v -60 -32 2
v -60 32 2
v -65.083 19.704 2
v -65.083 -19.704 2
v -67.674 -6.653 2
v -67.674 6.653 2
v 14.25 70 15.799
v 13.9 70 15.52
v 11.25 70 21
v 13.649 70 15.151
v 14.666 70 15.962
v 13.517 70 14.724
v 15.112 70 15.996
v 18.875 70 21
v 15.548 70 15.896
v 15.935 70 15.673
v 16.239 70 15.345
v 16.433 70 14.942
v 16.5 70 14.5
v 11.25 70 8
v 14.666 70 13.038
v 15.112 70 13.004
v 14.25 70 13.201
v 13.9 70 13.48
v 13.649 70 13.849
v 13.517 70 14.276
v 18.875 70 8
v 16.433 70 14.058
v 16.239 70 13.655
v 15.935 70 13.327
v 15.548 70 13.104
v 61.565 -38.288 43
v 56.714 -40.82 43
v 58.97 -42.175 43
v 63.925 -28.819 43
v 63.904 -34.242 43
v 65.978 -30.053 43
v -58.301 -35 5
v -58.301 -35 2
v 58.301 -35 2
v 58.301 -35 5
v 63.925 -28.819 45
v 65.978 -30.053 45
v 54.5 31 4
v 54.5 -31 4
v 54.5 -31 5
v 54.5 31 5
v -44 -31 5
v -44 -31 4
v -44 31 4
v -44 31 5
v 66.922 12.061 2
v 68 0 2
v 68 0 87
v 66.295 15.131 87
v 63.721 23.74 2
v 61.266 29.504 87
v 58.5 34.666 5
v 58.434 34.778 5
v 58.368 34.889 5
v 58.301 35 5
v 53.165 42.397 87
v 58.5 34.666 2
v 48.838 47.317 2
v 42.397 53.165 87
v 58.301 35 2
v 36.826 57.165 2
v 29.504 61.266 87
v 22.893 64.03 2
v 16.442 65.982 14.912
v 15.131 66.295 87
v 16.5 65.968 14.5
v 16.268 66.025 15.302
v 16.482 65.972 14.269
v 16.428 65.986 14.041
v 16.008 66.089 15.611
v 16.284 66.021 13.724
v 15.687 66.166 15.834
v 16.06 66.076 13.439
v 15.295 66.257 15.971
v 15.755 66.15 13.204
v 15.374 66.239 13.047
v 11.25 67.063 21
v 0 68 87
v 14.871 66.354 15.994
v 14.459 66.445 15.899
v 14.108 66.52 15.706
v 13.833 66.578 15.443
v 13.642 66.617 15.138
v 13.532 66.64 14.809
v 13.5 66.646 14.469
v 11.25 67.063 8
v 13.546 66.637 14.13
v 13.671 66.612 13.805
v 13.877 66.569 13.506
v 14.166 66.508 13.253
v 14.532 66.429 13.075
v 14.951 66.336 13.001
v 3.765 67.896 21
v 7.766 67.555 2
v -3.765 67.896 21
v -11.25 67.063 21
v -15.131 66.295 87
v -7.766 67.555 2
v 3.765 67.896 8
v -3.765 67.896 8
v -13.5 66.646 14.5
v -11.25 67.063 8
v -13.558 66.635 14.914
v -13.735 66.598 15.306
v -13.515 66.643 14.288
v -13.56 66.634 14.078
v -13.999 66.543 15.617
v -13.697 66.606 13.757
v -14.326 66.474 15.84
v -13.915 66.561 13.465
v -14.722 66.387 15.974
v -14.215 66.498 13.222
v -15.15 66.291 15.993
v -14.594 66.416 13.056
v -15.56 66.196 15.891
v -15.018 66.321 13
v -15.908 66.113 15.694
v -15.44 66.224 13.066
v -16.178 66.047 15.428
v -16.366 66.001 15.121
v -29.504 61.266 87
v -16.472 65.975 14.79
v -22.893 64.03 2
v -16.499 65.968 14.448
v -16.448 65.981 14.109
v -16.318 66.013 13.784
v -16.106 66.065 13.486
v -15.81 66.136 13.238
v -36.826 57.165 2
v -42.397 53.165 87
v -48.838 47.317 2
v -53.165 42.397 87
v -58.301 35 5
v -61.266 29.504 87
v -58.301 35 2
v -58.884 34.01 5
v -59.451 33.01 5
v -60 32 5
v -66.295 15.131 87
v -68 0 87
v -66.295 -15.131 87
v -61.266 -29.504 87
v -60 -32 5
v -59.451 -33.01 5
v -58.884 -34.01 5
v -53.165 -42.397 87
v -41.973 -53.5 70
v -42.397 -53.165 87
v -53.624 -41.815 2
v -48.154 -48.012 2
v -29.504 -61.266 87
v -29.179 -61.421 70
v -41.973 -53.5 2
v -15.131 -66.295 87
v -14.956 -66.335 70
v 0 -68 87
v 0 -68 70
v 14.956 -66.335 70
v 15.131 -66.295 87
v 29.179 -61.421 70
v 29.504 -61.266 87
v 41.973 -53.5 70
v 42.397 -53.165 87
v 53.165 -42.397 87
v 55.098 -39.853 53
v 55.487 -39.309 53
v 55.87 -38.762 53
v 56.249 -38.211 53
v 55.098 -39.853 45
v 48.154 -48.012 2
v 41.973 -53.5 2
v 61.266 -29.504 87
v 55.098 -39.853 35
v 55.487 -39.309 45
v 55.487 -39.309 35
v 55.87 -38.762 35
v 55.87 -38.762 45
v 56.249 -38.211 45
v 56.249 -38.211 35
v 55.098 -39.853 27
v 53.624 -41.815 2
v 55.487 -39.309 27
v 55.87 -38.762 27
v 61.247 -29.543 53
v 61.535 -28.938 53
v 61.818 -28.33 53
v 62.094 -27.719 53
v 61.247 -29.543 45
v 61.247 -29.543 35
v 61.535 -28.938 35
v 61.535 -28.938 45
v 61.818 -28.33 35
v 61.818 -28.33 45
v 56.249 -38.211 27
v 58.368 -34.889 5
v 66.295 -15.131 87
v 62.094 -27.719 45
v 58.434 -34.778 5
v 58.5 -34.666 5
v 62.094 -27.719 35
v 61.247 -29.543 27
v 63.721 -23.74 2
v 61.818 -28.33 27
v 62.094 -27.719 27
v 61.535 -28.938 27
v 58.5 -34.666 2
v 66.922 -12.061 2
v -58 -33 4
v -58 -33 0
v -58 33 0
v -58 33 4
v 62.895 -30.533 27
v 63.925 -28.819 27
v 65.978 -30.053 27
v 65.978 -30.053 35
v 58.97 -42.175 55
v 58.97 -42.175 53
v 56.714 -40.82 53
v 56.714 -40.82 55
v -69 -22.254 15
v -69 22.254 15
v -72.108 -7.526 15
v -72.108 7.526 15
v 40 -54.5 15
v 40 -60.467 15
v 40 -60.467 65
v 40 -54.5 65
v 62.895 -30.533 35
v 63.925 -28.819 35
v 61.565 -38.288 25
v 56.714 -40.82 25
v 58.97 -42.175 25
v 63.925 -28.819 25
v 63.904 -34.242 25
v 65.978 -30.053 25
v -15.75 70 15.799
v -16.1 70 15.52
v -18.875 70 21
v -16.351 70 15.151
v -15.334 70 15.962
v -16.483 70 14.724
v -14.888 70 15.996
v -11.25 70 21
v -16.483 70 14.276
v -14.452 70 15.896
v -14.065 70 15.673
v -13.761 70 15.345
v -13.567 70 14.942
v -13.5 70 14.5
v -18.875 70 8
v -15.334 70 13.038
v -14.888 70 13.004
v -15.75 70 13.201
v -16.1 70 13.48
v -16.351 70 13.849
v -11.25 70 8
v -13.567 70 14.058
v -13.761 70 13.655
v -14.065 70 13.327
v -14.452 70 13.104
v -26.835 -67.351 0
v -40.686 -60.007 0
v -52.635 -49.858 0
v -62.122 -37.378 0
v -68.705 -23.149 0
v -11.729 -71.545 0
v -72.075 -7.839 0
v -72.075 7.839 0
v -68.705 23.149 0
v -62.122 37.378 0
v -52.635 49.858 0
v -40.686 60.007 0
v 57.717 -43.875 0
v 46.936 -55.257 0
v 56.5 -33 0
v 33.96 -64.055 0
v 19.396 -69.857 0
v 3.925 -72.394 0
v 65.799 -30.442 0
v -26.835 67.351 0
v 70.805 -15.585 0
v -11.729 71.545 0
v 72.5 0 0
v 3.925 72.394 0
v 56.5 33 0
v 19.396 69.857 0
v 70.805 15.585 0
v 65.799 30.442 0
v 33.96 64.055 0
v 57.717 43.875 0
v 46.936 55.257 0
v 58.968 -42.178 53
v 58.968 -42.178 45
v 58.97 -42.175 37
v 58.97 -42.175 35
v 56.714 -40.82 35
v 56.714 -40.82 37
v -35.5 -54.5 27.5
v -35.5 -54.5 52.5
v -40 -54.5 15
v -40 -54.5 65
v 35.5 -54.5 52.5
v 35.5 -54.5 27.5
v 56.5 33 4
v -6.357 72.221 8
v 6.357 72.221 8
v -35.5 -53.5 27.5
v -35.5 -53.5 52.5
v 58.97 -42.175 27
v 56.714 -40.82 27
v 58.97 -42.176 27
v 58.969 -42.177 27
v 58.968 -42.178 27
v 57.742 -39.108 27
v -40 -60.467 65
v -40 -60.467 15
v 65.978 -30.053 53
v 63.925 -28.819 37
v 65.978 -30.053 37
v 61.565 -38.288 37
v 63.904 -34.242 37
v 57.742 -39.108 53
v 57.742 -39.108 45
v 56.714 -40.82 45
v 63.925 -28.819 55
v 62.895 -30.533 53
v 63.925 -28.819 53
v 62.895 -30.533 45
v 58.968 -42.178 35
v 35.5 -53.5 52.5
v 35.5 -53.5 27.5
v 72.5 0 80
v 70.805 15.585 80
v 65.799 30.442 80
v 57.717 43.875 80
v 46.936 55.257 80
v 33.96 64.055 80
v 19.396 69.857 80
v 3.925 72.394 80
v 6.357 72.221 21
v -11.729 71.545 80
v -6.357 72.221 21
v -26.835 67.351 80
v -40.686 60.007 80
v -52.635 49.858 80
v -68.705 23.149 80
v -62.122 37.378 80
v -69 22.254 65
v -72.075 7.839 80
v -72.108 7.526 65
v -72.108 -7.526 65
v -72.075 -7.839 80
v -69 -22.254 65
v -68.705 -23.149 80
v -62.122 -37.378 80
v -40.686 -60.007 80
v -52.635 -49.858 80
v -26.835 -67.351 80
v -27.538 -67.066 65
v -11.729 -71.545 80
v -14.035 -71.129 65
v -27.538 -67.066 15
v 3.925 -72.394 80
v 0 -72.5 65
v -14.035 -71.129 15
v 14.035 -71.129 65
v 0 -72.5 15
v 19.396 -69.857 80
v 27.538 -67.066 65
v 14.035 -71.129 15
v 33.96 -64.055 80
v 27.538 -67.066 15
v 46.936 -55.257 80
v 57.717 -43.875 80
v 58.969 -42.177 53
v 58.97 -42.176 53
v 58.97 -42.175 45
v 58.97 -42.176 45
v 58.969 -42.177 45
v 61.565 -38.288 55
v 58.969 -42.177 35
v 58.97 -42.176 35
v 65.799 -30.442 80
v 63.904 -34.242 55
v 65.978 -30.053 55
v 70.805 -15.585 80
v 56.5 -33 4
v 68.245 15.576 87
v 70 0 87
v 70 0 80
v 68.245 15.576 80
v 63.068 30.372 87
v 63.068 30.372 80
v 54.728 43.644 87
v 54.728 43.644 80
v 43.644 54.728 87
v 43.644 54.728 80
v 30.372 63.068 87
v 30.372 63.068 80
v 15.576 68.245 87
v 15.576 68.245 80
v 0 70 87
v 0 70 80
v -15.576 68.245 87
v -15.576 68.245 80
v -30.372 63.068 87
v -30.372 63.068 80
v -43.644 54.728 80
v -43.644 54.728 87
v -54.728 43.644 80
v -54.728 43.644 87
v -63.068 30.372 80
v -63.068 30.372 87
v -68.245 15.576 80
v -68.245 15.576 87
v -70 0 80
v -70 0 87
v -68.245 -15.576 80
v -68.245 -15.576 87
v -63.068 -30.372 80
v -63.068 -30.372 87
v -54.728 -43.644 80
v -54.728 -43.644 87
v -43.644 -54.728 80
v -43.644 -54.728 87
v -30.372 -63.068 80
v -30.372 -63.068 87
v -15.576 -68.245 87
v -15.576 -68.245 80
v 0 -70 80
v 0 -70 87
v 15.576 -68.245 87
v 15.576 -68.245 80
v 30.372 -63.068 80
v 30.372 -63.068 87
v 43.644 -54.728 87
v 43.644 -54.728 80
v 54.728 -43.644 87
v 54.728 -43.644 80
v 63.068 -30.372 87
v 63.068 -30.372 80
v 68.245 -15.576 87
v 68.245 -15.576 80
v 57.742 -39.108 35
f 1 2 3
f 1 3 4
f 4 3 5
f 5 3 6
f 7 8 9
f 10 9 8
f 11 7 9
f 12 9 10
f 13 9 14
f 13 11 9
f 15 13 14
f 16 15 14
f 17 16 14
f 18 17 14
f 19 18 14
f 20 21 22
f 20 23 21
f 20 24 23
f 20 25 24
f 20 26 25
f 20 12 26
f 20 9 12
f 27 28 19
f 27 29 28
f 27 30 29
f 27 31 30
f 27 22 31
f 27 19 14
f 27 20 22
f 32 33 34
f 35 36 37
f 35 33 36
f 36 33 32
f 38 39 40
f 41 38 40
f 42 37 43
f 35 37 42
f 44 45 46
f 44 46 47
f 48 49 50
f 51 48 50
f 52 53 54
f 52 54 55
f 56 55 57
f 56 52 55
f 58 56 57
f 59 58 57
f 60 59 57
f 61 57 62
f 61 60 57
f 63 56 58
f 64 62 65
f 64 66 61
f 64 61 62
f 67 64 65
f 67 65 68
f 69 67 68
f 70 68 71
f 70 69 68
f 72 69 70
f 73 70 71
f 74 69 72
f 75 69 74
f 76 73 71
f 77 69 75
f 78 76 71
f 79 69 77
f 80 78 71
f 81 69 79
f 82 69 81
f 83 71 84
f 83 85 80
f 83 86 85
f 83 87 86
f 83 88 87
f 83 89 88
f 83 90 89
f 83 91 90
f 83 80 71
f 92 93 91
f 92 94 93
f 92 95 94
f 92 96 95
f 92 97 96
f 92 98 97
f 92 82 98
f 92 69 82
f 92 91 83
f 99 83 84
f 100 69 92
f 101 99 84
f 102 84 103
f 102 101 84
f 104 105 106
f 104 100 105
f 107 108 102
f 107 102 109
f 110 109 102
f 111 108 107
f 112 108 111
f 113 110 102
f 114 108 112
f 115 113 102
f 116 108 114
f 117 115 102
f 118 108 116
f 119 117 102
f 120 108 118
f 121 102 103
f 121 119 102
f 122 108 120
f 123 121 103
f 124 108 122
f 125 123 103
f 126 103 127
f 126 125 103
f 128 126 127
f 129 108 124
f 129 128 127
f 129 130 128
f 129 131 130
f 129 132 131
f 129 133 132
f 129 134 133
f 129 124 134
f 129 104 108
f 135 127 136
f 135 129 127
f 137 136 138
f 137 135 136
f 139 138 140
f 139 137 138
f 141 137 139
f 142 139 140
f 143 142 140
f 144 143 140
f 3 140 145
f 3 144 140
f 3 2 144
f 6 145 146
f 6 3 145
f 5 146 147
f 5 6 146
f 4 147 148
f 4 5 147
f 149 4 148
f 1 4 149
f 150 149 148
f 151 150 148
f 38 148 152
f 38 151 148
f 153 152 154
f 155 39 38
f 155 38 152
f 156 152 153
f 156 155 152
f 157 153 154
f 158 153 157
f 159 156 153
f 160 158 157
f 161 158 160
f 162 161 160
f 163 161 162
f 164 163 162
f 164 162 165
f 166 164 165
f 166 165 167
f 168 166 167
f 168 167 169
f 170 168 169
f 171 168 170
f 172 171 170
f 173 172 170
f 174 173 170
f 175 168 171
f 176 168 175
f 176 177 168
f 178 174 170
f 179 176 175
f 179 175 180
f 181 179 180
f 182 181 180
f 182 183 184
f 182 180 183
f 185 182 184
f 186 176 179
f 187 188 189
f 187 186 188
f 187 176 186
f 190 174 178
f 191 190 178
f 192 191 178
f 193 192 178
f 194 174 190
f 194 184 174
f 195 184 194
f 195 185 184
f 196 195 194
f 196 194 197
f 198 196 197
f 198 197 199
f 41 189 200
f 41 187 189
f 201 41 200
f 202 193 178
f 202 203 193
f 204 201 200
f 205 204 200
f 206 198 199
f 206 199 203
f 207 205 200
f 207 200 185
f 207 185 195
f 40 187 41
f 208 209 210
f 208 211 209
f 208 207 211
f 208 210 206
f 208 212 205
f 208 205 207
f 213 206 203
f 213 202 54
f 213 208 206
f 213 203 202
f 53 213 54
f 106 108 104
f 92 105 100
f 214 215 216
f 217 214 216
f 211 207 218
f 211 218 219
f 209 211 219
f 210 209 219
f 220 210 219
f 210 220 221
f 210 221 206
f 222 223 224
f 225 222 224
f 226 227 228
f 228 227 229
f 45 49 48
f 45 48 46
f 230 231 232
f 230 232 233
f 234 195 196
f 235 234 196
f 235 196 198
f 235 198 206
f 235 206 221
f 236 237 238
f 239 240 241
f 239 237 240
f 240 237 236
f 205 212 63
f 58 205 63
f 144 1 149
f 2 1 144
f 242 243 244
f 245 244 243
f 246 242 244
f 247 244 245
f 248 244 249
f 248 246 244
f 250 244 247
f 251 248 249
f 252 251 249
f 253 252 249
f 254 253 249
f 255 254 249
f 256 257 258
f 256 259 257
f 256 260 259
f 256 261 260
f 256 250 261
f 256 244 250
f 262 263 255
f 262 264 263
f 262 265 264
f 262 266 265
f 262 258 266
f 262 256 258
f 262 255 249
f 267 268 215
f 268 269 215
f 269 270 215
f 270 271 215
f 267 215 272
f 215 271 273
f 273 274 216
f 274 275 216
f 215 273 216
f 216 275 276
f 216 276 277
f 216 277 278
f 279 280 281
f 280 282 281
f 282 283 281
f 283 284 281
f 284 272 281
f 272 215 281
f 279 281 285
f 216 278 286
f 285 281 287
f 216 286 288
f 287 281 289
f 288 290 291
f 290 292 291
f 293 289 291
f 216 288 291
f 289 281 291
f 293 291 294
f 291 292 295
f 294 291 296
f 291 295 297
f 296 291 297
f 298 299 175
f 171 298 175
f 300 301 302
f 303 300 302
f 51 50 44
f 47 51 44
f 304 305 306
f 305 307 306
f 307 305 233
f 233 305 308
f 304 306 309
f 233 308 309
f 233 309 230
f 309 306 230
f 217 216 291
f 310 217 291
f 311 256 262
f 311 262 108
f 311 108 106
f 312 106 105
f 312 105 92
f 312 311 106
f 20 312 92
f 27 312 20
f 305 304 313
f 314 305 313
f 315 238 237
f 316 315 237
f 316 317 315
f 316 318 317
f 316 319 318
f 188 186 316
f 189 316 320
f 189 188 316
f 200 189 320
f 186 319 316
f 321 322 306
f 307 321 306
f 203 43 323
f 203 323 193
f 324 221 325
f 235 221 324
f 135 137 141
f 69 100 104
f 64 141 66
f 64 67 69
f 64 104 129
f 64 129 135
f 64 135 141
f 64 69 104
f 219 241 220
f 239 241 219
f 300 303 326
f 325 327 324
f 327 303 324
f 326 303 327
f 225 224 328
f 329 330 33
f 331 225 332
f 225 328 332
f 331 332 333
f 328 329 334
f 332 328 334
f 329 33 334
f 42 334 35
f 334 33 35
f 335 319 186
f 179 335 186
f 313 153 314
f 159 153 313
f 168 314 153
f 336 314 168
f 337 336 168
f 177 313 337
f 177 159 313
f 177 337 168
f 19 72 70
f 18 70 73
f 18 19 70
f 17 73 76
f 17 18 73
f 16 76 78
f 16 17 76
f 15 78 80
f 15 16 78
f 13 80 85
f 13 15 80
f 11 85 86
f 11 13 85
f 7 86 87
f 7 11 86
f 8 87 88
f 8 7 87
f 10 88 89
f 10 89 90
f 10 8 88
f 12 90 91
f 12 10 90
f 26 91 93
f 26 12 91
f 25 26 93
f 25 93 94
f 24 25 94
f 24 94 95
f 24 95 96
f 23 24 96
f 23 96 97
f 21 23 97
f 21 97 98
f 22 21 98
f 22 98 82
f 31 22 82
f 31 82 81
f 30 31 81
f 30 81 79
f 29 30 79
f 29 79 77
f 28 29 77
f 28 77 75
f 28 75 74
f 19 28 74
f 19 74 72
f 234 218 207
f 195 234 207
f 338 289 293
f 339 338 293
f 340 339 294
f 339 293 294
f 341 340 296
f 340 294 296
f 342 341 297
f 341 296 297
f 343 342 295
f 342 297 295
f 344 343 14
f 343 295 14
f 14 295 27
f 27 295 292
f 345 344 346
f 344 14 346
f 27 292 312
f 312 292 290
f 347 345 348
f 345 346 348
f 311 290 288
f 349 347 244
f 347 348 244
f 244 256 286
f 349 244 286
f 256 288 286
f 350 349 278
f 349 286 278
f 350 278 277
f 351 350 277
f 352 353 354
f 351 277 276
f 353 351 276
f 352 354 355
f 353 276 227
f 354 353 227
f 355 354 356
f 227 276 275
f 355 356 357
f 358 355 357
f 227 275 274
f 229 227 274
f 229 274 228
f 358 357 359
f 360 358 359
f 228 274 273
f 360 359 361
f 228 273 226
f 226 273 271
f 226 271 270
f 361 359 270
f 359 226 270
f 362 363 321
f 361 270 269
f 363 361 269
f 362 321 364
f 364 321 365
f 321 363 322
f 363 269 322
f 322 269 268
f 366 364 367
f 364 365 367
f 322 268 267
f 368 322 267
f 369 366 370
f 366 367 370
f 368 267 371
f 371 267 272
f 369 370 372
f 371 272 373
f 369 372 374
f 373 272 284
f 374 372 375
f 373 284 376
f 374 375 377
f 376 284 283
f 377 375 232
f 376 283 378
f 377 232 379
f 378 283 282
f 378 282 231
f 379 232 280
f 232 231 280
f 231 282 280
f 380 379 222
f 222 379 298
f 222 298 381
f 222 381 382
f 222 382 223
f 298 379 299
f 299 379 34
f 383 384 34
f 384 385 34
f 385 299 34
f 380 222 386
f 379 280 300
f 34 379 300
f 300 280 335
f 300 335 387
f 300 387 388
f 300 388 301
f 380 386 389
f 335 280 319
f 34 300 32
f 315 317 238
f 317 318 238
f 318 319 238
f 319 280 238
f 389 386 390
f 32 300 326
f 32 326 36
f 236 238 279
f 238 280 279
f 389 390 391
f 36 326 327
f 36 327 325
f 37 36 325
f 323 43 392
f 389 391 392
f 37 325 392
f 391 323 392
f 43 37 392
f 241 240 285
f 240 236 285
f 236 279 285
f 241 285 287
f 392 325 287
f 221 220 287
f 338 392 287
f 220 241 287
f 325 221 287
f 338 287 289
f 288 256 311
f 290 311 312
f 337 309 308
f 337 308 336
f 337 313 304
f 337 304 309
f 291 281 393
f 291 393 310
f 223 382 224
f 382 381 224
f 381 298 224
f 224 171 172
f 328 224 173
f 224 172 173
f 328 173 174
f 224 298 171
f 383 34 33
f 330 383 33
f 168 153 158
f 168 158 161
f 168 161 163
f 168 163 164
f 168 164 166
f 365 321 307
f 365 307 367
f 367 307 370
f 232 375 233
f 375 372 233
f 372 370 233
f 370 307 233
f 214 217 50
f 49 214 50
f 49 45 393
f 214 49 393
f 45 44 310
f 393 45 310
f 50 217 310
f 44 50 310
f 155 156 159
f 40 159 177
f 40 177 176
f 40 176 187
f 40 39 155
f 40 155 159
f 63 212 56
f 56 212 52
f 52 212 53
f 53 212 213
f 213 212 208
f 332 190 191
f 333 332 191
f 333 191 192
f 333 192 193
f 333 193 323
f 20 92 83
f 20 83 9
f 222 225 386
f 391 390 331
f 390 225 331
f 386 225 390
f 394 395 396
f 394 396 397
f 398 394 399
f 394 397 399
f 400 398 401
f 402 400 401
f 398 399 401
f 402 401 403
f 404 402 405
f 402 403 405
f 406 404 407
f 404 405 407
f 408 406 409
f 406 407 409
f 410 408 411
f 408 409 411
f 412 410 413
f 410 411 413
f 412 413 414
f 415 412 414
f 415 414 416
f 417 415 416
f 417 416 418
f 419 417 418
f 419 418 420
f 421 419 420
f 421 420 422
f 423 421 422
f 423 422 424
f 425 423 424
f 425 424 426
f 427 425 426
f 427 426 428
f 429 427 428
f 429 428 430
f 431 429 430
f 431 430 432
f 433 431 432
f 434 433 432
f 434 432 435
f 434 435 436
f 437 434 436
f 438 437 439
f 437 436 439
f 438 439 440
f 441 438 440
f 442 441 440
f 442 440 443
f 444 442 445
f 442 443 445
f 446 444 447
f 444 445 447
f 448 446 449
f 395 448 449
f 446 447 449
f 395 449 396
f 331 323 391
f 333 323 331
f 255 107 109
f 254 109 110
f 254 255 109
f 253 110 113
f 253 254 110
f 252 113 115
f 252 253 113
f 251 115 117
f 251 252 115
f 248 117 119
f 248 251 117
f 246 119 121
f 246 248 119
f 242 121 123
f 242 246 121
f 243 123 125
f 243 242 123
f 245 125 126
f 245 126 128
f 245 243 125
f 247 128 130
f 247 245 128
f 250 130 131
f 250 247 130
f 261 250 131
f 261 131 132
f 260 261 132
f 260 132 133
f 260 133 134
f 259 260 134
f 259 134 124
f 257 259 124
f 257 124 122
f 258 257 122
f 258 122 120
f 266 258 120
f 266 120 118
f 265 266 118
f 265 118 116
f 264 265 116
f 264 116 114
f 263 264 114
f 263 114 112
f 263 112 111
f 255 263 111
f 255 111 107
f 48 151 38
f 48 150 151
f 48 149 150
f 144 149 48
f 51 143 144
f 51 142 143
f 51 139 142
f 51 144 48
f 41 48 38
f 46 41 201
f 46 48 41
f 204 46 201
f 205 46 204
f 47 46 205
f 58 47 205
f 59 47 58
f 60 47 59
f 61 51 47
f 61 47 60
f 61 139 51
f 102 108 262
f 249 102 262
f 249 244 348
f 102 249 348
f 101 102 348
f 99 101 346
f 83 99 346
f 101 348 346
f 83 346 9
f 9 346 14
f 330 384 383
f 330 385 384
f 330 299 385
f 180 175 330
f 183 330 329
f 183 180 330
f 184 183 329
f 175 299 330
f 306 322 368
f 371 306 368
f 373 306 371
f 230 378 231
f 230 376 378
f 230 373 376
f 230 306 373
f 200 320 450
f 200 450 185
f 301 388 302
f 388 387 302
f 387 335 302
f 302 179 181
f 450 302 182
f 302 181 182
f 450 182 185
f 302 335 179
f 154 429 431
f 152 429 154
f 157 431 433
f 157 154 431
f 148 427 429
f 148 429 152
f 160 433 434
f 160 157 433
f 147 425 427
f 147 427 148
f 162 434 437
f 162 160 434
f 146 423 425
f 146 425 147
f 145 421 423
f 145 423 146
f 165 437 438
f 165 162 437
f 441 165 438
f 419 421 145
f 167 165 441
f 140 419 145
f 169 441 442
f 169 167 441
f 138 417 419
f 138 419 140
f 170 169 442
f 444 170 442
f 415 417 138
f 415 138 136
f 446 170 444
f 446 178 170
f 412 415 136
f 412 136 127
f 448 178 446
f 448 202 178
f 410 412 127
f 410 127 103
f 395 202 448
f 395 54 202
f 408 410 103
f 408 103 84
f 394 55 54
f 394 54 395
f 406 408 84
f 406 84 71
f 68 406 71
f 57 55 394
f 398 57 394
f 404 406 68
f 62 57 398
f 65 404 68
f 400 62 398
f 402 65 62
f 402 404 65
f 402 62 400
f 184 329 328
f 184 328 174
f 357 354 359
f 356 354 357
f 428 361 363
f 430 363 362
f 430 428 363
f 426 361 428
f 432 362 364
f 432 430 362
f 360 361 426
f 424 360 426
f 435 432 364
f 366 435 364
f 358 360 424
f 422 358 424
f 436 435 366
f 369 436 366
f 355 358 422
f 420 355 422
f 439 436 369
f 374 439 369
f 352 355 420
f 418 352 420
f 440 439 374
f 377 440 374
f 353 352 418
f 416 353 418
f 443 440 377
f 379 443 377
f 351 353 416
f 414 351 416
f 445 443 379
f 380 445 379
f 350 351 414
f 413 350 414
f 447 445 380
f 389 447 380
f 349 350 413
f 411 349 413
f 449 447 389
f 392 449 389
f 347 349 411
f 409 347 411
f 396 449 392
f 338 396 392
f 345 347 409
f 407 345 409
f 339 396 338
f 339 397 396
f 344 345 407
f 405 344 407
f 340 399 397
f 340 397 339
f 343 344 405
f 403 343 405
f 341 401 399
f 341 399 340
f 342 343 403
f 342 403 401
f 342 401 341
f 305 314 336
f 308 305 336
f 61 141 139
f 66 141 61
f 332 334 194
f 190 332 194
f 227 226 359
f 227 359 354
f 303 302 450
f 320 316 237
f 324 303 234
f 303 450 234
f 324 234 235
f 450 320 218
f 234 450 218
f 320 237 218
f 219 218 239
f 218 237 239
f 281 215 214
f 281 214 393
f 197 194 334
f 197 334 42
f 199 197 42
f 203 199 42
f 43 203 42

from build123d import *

# Parameters (mm, degrees)
CYLINDER004_R          = 1.5
CYLINDER004_DEPTH      = 10
CYLINDER004_ROLL_ANGLE = 90
CYLINDER003_R          = 1.5
CYLINDER003_DEPTH      = 10
CYLINDER003_ROLL_ANGLE = 90
BOX016_W               = 22.5
BOX016_H               = 13
BOX016_DEPTH           = 13
BOX015_W               = 38
BOX015_H               = 10
BOX015_DEPTH           = 13
BOX013_W               = 98.5
BOX013_H               = 62
BOX013_DEPTH           = 10
BOX012_W               = 114.5
BOX012_H               = 66
BOX012_DEPTH           = 4
BOX014_W               = 118.5
BOX014_H               = 70
BOX014_DEPTH           = 5
BOX010_W               = 2
BOX010_H               = 10
BOX010_DEPTH           = 8
BOX010_PLACEMENT_ANGLE = 59
BOX011_W               = 2
BOX011_H               = 10
BOX011_DEPTH           = 8
BOX011_PLACEMENT_ANGLE = 59
BOX009_W               = 2
BOX009_H               = 10
BOX009_DEPTH           = 8
BOX009_PLACEMENT_ANGLE = 59
BOX008_W               = 2
BOX008_H               = 10
BOX008_DEPTH           = 8
BOX008_PLACEMENT_ANGLE = 59
BOX007_W               = 10
BOX007_H               = 45
BOX007_DEPTH           = 50
BOX006_W               = 14
BOX006_H               = 12
BOX006_DEPTH           = 12
BOX006_PLACEMENT_ANGLE = 59
BOX004_W               = 14
BOX004_H               = 12
BOX004_DEPTH           = 12
BOX004_PLACEMENT_ANGLE = 59
BOX002_W               = 71
BOX002_H               = 10
BOX002_DEPTH           = 25
BOX001_W               = 80
BOX001_H               = 30
BOX001_DEPTH           = 50
BOX_W                  = 84
BOX_H                  = 30
BOX_DEPTH              = 70
CYLINDER001_R          = 70
CYLINDER001_DEPTH      = 87
CYLINDER_R             = 72.5
CYLINDER_DEPTH         = 80
CYLINDER002_R          = 68
CYLINDER002_DEPTH      = 85


with BuildPart() as screwcutout002:
    # Cylinder004 → Cylinder004 (new body)
    with BuildSketch(Plane.XY):
        Circle(CYLINDER004_R)
    extrude(amount=CYLINDER004_DEPTH)


with BuildPart() as screwcutout002_1:
    # Cylinder004 roll: moved
    add(screwcutout002.part.rotate(Axis((0, 0, 0), (1, 0, 0)), CYLINDER004_ROLL_ANGLE))


with BuildPart() as screwcutout002_2:
    # Cylinder004 placement: moved
    add(screwcutout002_1.part.moved(Location((-15, 73, 14.5))))


with BuildPart() as screwcutout1:
    # Cylinder003 → Cylinder003 (new body)
    with BuildSketch(Plane.XY):
        Circle(CYLINDER003_R)
    extrude(amount=CYLINDER003_DEPTH)


with BuildPart() as screwcutout1_1:
    # Cylinder003 roll: moved
    add(screwcutout1.part.rotate(Axis((0, 0, 0), (1, 0, 0)), CYLINDER003_ROLL_ANGLE))


with BuildPart() as screwcutout1_2:
    # Cylinder003 placement: moved
    add(screwcutout1_1.part.moved(Location((15, 73, 14.5))))


with BuildPart() as powercutout:
    # Box016 → Box016 (new body)
    with BuildSketch(Plane(origin=(-11.25, 63, 8), x_dir=(1, 0, 0), z_dir=(0, 0, 1))):
        with Locations((11.25, 6.5)):
            Rectangle(BOX016_W, BOX016_H)
    extrude(amount=BOX016_DEPTH)


with BuildPart() as powerswitch:
    # Box015 → Box015 (new body)
    with BuildSketch(Plane(origin=(-19, 70, 8), x_dir=(1, 0, 0), z_dir=(0, 0, 1))):
        with Locations((19, 5)):
            Rectangle(BOX015_W, BOX015_H)
    extrude(amount=BOX015_DEPTH)


with BuildPart() as battery_cutout:
    # Box013 → Box013 (new body)
    with BuildSketch(Plane(origin=(-44, -31, 0), x_dir=(1, 0, 0), z_dir=(0, 0, 1))):
        with Locations((49.25, 31)):
            Rectangle(BOX013_W, BOX013_H)
    extrude(amount=BOX013_DEPTH)


with BuildPart() as battery_cutout001:
    # Box012 → Box012 (new body)
    with BuildSketch(Plane(origin=(-58, -33, 0), x_dir=(1, 0, 0), z_dir=(0, 0, 1))):
        with Locations((57.25, 33)):
            Rectangle(BOX012_W, BOX012_H)
    extrude(amount=BOX012_DEPTH)


with BuildPart() as battery_fillup:
    # Box014 → Box014 (new body)
    with BuildSketch(Plane(origin=(-60, -35, 0), x_dir=(1, 0, 0), z_dir=(0, 0, 1))):
        with Locations((59.25, 35)):
            Rectangle(BOX014_W, BOX014_H)
    extrude(amount=BOX014_DEPTH)


with BuildPart() as pin2_cutout001:
    # Box010 → Box010 (new body)
    with BuildSketch(Plane.XY):
        with Locations((1, 5)):
            Rectangle(BOX010_W, BOX010_H)
    extrude(amount=BOX010_DEPTH)


with BuildPart() as pin2_cutout001_1:
    # Box010 placement: moved
    add(pin2_cutout001.part.moved(Location((67, -33, 45))).rotate(Axis((67, -33, 45), (0, 0, 1)), BOX010_PLACEMENT_ANGLE))


with BuildPart() as pin1_cutout001:
    # Box011 → Box011 (new body)
    with BuildSketch(Plane.XY):
        with Locations((1, 5)):
            Rectangle(BOX011_W, BOX011_H)
    extrude(amount=BOX011_DEPTH)


with BuildPart() as pin1_cutout001_1:
    # Box011 placement: moved
    add(pin1_cutout001.part.moved(Location((62, -44, 45))).rotate(Axis((62, -44, 45), (0, 0, 1)), BOX011_PLACEMENT_ANGLE))


with BuildPart() as pin2_cutout:
    # Box009 → Box009 (new body)
    with BuildSketch(Plane.XY):
        with Locations((1, 5)):
            Rectangle(BOX009_W, BOX009_H)
    extrude(amount=BOX009_DEPTH)


with BuildPart() as pin2_cutout_1:
    # Box009 placement: moved
    add(pin2_cutout.part.moved(Location((67, -33, 27))).rotate(Axis((67, -33, 27), (0, 0, 1)), BOX009_PLACEMENT_ANGLE))


with BuildPart() as pin1_cutout:
    # Box008 → Box008 (new body)
    with BuildSketch(Plane.XY):
        with Locations((1, 5)):
            Rectangle(BOX008_W, BOX008_H)
    extrude(amount=BOX008_DEPTH)


with BuildPart() as pin1_cutout_1:
    # Box008 placement: moved
    add(pin1_cutout.part.moved(Location((62, -44, 27))).rotate(Axis((62, -44, 27), (0, 0, 1)), BOX008_PLACEMENT_ANGLE))


with BuildPart() as rfid_cutout:
    # Box007 → Box007 (new body)
    with BuildSketch(Plane(origin=(-79, -22.5, 15), x_dir=(1, 0, 0), z_dir=(0, 0, 1))):
        with Locations((5, 22.5)):
            Rectangle(BOX007_W, BOX007_H)
    extrude(amount=BOX007_DEPTH)


with BuildPart() as box006:
    # Box006 → Box006 (new body)
    with BuildSketch(Plane.XY):
        with Locations((7, 6)):
            Rectangle(BOX006_W, BOX006_H)
    extrude(amount=BOX006_DEPTH)


with BuildPart() as box006_1:
    # Box006 placement: moved
    add(box006.part.moved(Location((67, -47, 25))).rotate(Axis((67, -47, 25), (0, 0, 1)), BOX006_PLACEMENT_ANGLE))


with BuildPart() as box004:
    # Box004 → Box004 (new body)
    with BuildSketch(Plane.XY):
        with Locations((7, 6)):
            Rectangle(BOX004_W, BOX004_H)
    extrude(amount=BOX004_DEPTH)


with BuildPart() as box004_1:
    # Box004 placement: moved
    add(box004.part.moved(Location((67, -47, 43))).rotate(Axis((67, -47, 43), (0, 0, 1)), BOX004_PLACEMENT_ANGLE))


with BuildPart() as inner_dsp_cutout:
    # Box002 → Box002 (new body)
    with BuildSketch(Plane(origin=(-35.5, -59, 27.5), x_dir=(1, 0, 0), z_dir=(0, 0, 1))):
        with Locations((35.5, 5)):
            Rectangle(BOX002_W, BOX002_H)
    extrude(amount=BOX002_DEPTH)


with BuildPart() as display_cutout_big:
    # Box001 → Box001 (new body)
    with BuildSketch(Plane(origin=(-40, -84.5, 15), x_dir=(1, 0, 0), z_dir=(0, 0, 1))):
        with Locations((40, 15)):
            Rectangle(BOX001_W, BOX001_H)
    extrude(amount=BOX001_DEPTH)


with BuildPart() as display_fillup:
    # Box → Box (new body)
    with BuildSketch(Plane(origin=(-42, -83.5, 0), x_dir=(1, 0, 0), z_dir=(0, 0, 1))):
        with Locations((42, 15)):
            Rectangle(BOX_W, BOX_H)
    extrude(amount=BOX_DEPTH)


with BuildPart() as wall:
    # Cylinder001 → Cylinder001 (new body)
    with BuildSketch(Plane.XY):
        Circle(CYLINDER001_R)
    extrude(amount=CYLINDER001_DEPTH)


with BuildPart() as fusion:
    # Cylinder → Cylinder (new body)
    with BuildSketch(Plane.XY):
        Circle(CYLINDER_R)
    extrude(amount=CYLINDER_DEPTH)

    # Fusion: union wall
    add(wall.part)


with BuildPart() as common:
    # Common base: copy of Fusion
    add(fusion.part)

    # Common: intersect display_fillup
    add(display_fillup.part, mode=Mode.INTERSECT)


with BuildPart() as base_cutout:
    # Cylinder002 → Cylinder002 (new body)
    with BuildSketch(Plane.XY.offset(2)):
        Circle(CYLINDER002_R)
    extrude(amount=CYLINDER002_DEPTH)


with BuildPart() as cut016:
    # Cut base: copy of Fusion
    add(fusion.part)

    # Cut: cut base_cutout
    add(base_cutout.part, mode=Mode.SUBTRACT)

    # Fusion001: union Common
    add(common.part)

    # Cut001: cut display_cutout_big
    add(display_cutout_big.part, mode=Mode.SUBTRACT)

    # Cut002: cut inner_dsp_cutout
    add(inner_dsp_cutout.part, mode=Mode.SUBTRACT)

    # Cut003: cut Box004
    add(box004_1.part, mode=Mode.SUBTRACT)

    # Cut004: cut Box006
    add(box006_1.part, mode=Mode.SUBTRACT)

    # Cut005: cut rfid_cutout
    add(rfid_cutout.part, mode=Mode.SUBTRACT)

    # Cut006: cut pin1_cutout
    add(pin1_cutout_1.part, mode=Mode.SUBTRACT)

    # Cut007: cut pin2_cutout
    add(pin2_cutout_1.part, mode=Mode.SUBTRACT)

    # Cut008: cut pin1_cutout001
    add(pin1_cutout001_1.part, mode=Mode.SUBTRACT)

    # Cut009: cut pin2_cutout001
    add(pin2_cutout001_1.part, mode=Mode.SUBTRACT)

    # Fusion002: union battery_fillup
    add(battery_fillup.part)

    # Cut010: cut battery_cutout001
    add(battery_cutout001.part, mode=Mode.SUBTRACT)

    # Cut011: cut battery_cutout
    add(battery_cutout.part, mode=Mode.SUBTRACT)

    # Cut012: cut PowerSwitch
    add(powerswitch.part, mode=Mode.SUBTRACT)

    # Cut013: cut PowerSwitch
    add(powerswitch.part, mode=Mode.SUBTRACT)

    # Cut014: cut PowerCutout
    add(powercutout.part, mode=Mode.SUBTRACT)

    # Cut015: cut ScrewCutout1
    add(screwcutout1_2.part, mode=Mode.SUBTRACT)

    # Cut016: cut ScrewCutout002
    add(screwcutout002_2.part, mode=Mode.SUBTRACT)


solid = cut016.part
